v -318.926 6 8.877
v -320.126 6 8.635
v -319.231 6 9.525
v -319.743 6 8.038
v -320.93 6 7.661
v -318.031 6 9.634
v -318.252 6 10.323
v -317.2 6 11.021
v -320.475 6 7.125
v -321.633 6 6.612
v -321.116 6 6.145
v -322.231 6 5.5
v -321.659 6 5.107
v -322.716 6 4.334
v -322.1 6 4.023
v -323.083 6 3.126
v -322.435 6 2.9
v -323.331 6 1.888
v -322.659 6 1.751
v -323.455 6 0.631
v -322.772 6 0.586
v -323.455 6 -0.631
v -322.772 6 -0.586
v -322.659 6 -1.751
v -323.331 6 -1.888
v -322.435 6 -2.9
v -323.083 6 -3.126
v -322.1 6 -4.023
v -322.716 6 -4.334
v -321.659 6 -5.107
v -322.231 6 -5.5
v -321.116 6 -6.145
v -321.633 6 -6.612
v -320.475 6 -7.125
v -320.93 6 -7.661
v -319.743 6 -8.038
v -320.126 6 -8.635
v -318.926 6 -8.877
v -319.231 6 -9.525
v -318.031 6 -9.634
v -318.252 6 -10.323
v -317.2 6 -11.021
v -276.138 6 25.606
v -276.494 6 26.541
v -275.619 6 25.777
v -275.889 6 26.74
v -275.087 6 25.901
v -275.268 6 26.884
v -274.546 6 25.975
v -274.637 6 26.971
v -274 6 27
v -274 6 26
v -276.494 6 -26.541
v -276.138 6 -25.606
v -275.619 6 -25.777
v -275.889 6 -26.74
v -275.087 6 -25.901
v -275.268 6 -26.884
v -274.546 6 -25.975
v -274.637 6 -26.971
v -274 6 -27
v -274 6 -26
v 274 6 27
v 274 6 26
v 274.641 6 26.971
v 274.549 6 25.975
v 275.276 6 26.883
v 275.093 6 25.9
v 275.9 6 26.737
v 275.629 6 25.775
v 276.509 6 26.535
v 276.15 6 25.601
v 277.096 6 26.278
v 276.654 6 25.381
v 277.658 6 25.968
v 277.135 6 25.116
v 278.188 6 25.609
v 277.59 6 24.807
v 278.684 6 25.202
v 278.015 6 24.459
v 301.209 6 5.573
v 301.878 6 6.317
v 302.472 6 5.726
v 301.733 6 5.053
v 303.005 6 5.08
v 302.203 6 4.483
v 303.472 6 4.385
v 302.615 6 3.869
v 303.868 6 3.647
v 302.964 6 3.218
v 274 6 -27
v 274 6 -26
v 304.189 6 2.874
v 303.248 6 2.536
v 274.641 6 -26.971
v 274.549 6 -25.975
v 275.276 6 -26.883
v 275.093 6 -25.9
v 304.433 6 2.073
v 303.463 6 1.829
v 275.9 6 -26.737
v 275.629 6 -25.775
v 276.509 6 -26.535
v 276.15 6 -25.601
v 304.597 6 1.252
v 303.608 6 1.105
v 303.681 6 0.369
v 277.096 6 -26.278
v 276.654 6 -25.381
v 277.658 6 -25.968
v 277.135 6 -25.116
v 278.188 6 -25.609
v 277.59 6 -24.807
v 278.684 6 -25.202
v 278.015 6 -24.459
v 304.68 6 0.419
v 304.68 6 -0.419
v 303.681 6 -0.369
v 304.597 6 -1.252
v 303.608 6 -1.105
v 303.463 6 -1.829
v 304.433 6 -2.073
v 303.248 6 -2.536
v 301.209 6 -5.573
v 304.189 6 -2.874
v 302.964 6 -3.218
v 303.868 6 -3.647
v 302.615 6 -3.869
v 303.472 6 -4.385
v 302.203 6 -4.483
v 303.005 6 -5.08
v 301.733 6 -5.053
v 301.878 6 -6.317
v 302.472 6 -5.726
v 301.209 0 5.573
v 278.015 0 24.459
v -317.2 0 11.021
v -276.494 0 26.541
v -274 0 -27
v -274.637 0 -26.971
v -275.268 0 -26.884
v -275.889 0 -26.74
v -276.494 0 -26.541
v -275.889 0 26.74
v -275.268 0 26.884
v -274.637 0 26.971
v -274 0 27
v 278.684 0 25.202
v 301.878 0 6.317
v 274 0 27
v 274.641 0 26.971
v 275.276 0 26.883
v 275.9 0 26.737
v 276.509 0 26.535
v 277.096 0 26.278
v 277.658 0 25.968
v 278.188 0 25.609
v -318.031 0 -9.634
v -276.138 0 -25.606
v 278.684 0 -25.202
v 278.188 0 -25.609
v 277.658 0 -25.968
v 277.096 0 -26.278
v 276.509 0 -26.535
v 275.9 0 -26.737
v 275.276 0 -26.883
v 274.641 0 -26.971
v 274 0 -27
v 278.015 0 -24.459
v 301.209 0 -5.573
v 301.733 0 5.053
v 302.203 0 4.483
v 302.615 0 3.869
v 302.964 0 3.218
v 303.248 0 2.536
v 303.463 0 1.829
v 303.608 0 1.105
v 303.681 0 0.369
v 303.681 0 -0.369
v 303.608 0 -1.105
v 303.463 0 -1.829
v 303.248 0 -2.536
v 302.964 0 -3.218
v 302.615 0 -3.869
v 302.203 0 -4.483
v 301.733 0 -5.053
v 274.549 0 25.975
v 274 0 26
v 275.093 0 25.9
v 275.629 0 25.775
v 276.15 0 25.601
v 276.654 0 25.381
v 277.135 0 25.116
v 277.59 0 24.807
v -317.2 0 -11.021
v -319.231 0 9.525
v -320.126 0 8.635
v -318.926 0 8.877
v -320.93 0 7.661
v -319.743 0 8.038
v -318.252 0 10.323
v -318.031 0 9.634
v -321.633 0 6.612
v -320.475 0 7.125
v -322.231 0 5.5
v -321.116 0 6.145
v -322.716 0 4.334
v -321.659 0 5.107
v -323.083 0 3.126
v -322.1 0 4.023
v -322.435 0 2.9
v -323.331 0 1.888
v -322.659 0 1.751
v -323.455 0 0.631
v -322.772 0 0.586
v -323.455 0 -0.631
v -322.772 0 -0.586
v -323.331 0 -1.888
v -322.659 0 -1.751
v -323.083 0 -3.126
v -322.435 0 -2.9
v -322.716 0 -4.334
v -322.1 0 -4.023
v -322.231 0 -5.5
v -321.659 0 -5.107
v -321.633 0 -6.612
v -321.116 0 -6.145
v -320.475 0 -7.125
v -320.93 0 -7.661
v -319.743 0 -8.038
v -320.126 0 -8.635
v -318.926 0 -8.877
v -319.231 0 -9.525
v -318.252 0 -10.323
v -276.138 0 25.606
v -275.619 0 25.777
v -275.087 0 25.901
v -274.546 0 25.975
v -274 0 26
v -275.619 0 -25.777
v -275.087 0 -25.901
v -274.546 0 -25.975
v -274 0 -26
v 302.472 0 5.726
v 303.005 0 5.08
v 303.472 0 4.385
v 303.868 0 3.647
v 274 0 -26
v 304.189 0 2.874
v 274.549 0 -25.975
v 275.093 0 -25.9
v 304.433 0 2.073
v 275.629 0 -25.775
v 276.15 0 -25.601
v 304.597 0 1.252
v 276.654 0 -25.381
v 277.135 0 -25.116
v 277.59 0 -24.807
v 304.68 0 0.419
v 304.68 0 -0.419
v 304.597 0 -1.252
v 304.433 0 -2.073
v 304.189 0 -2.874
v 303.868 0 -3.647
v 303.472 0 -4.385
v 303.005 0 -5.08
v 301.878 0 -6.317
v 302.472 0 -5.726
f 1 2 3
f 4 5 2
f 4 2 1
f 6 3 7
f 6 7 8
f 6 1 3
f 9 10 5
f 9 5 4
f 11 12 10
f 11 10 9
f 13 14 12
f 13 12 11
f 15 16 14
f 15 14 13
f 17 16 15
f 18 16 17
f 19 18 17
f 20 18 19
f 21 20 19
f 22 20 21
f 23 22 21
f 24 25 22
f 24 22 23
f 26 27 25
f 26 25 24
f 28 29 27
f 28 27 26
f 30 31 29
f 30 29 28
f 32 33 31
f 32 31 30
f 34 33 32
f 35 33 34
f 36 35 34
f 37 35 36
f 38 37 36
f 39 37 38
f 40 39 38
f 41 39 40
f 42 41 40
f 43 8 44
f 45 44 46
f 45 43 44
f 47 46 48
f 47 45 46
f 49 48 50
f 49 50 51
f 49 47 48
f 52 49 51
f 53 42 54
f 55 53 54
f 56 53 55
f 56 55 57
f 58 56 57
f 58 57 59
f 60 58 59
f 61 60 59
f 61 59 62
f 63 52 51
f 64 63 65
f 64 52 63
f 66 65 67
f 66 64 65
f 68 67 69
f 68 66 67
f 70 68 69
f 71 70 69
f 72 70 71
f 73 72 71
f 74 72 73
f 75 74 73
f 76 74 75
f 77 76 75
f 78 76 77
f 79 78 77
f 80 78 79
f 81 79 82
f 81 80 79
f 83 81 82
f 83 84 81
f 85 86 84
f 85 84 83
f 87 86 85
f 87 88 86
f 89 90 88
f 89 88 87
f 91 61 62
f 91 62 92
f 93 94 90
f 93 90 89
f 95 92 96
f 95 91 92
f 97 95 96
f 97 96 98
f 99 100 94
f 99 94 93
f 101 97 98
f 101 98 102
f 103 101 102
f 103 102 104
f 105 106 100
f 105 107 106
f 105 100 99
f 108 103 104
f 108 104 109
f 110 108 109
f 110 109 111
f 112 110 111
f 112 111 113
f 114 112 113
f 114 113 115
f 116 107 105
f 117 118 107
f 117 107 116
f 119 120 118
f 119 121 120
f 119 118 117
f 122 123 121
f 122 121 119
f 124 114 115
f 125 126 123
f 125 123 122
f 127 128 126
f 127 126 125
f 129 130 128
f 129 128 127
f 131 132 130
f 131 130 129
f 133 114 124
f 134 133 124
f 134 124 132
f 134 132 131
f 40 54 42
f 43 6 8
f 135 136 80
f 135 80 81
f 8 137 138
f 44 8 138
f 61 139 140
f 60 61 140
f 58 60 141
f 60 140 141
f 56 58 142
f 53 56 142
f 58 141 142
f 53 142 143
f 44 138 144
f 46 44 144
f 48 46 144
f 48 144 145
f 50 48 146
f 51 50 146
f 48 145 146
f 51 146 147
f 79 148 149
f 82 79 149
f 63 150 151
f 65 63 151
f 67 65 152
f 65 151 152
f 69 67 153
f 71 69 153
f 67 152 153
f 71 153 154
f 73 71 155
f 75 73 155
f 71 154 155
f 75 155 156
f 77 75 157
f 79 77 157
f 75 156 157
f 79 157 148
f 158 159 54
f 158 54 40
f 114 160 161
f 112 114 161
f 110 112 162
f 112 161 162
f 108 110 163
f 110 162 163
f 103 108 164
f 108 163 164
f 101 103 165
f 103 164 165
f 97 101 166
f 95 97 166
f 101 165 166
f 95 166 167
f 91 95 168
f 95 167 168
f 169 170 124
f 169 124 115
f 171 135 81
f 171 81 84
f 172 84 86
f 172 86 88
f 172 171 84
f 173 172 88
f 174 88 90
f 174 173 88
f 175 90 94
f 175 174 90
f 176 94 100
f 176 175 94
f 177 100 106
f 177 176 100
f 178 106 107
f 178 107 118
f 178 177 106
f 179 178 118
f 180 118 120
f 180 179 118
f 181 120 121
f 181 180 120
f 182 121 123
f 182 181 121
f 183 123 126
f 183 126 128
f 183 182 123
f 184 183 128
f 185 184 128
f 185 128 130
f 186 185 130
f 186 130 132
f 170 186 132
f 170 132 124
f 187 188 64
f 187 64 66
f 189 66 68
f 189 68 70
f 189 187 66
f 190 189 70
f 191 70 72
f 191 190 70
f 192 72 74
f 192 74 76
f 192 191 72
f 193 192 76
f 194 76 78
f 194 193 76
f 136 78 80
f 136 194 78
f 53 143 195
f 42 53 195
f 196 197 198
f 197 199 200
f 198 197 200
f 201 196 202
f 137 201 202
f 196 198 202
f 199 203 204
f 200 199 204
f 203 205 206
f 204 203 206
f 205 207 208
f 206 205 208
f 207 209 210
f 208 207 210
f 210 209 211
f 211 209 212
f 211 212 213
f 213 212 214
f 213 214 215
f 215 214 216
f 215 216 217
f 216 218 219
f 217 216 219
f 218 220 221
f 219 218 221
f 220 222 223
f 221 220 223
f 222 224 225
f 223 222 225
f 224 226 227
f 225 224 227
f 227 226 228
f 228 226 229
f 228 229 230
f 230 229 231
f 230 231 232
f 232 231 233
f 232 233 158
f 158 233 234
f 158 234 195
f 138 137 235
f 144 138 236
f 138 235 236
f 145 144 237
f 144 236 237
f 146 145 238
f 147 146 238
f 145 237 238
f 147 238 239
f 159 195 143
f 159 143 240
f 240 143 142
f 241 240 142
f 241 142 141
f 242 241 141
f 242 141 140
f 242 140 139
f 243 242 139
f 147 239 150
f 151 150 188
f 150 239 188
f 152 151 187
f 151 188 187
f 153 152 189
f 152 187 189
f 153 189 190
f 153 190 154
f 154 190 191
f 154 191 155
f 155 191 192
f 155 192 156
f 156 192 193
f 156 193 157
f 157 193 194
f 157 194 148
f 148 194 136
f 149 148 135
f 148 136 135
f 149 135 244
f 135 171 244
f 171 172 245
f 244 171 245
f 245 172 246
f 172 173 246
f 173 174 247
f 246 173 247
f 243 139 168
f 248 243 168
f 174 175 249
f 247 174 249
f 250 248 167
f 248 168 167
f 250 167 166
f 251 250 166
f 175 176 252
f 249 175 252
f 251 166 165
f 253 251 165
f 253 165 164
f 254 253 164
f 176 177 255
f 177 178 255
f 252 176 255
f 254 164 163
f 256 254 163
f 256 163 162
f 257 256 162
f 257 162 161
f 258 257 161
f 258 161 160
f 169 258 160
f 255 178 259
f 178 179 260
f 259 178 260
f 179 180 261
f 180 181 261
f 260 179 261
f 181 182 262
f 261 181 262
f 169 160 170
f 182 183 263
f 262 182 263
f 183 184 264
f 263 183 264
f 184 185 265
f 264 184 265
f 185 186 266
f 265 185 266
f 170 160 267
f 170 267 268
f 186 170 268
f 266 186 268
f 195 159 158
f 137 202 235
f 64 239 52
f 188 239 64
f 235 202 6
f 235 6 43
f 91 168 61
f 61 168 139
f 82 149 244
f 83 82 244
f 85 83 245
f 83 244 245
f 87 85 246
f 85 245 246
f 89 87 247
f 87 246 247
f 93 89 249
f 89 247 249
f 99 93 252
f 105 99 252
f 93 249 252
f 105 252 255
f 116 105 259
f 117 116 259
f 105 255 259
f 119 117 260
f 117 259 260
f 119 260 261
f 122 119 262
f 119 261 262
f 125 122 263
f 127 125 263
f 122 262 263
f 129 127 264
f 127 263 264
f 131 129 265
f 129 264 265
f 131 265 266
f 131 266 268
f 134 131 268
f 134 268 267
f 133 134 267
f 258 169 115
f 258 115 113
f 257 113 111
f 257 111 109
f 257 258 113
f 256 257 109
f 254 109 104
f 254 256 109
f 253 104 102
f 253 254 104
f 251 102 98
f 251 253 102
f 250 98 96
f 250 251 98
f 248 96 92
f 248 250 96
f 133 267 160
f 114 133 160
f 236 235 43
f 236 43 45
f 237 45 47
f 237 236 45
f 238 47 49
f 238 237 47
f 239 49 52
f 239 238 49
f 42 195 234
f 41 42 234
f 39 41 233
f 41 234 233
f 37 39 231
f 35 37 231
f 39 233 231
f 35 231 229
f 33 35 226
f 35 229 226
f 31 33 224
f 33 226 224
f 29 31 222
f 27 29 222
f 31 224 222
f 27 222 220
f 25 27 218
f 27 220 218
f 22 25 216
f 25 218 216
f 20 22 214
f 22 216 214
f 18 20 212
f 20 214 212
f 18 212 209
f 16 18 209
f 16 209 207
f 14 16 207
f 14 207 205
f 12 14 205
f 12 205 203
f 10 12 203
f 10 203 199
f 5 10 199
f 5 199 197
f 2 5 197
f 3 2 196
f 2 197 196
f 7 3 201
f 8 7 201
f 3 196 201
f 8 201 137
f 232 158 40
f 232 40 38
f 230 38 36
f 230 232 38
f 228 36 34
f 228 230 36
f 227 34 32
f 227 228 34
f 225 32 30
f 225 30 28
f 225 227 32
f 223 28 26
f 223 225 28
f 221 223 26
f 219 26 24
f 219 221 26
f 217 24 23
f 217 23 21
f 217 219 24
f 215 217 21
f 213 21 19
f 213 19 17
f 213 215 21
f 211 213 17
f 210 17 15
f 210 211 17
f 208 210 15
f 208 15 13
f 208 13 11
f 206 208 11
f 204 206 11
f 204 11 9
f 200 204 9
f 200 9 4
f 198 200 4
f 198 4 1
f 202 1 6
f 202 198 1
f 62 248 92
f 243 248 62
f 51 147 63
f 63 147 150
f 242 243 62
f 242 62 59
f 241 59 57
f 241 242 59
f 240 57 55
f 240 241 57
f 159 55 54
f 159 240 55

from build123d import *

# Parameters (mm, degrees)
DODANIE_WYCI_GNI_CIE1_DEPTH = 6


with BuildPart() as part:
    # Szkic1 → Dodanie-wyciągnięcie1 (new body)
    with BuildSketch(Plane(origin=(0, 0, 0), x_dir=(1, 0, 0), z_dir=(0, 1, 0))):
        with BuildLine():
            Line((-276.493755035, 26.54073282), (-317.199927227, 11.020878293))
            ThreePointArc((-317.199927227, 11.020878293), (-323.470347305, 0), (-317.199927227, -11.020878293))
            Line((-317.199927227, -11.020878293), (-276.493755035, -26.54073282))
            ThreePointArc((-276.493755035, -26.54073282), (-275.267846651, -26.8842258), (-274, -27))
            Line((-274, -27), (274, -27))
            ThreePointArc((274, -27), (276.508698973, -26.535015644), (278.68411058, -25.20183699))
            Line((278.68411058, -25.20183699), (301.877848562, -6.316516345))
            ThreePointArc((301.877848562, -6.316516345), (304.69, 0), (301.877848562, 6.316516345))
            Line((301.877848562, 6.316516345), (278.68411058, 25.20183699))
            ThreePointArc((278.68411058, 25.20183699), (276.508698973, 26.535015644), (274, 27))
            Line((274, 27), (-274, 27))
            ThreePointArc((-274, 27), (-275.267846651, 26.8842258), (-276.493755035, 26.54073282))
        make_face()
        with BuildLine():
            ThreePointArc((-318.031465247, 9.633625156), (-322.786422983, 0), (-318.031465247, -9.633625156))
            Line((-318.031465247, -9.633625156), (-276.137504316, -25.606342417))
            ThreePointArc((-276.137504316, -25.606342417), (-275.086725701, -25.900764972), (-274, -26))
            Line((-274, -26), (274, -26))
            ThreePointArc((274, -26), (276.150313405, -25.60144198), (278.014951926, -24.45871742))
            Line((278.014951926, -24.45871742), (301.208689908, -5.573396775))
            ThreePointArc((301.208689908, -5.573396775), (303.69, 0), (301.208689908, 5.573396775))
            Line((301.208689908, 5.573396775), (278.014951926, 24.45871742))
            ThreePointArc((278.014951926, 24.45871742), (276.150313405, 25.60144198), (274, 26))
            Line((274, 26), (-274, 26))
            ThreePointArc((-274, 26), (-275.086725701, 25.900764972), (-276.137504316, 25.606342417))
            Line((-276.137504316, 25.606342417), (-318.031465247, 9.633625156))
        make_face(mode=Mode.SUBTRACT)
    extrude(amount=DODANIE_WYCI_GNI_CIE1_DEPTH)


solid = part.part
